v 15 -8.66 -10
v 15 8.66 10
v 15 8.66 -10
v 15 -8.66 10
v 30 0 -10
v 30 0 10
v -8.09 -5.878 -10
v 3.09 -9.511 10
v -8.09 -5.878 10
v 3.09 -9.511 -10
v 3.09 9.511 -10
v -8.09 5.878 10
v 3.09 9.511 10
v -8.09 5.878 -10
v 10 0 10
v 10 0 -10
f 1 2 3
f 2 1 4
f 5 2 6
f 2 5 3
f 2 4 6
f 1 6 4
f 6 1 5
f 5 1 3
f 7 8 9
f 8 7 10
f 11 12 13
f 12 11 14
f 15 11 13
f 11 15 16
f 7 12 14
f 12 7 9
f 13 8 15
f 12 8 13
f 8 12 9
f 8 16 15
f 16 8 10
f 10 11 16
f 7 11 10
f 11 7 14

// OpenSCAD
$fn = 3;

translate(v=[20, 0, 0]) {
    cylinder(r=10, h=20, center=true);
};

union() {
    $fn = $preview ? 4 : 5;
    cylinder(r=10, h=20, center=true);
};
